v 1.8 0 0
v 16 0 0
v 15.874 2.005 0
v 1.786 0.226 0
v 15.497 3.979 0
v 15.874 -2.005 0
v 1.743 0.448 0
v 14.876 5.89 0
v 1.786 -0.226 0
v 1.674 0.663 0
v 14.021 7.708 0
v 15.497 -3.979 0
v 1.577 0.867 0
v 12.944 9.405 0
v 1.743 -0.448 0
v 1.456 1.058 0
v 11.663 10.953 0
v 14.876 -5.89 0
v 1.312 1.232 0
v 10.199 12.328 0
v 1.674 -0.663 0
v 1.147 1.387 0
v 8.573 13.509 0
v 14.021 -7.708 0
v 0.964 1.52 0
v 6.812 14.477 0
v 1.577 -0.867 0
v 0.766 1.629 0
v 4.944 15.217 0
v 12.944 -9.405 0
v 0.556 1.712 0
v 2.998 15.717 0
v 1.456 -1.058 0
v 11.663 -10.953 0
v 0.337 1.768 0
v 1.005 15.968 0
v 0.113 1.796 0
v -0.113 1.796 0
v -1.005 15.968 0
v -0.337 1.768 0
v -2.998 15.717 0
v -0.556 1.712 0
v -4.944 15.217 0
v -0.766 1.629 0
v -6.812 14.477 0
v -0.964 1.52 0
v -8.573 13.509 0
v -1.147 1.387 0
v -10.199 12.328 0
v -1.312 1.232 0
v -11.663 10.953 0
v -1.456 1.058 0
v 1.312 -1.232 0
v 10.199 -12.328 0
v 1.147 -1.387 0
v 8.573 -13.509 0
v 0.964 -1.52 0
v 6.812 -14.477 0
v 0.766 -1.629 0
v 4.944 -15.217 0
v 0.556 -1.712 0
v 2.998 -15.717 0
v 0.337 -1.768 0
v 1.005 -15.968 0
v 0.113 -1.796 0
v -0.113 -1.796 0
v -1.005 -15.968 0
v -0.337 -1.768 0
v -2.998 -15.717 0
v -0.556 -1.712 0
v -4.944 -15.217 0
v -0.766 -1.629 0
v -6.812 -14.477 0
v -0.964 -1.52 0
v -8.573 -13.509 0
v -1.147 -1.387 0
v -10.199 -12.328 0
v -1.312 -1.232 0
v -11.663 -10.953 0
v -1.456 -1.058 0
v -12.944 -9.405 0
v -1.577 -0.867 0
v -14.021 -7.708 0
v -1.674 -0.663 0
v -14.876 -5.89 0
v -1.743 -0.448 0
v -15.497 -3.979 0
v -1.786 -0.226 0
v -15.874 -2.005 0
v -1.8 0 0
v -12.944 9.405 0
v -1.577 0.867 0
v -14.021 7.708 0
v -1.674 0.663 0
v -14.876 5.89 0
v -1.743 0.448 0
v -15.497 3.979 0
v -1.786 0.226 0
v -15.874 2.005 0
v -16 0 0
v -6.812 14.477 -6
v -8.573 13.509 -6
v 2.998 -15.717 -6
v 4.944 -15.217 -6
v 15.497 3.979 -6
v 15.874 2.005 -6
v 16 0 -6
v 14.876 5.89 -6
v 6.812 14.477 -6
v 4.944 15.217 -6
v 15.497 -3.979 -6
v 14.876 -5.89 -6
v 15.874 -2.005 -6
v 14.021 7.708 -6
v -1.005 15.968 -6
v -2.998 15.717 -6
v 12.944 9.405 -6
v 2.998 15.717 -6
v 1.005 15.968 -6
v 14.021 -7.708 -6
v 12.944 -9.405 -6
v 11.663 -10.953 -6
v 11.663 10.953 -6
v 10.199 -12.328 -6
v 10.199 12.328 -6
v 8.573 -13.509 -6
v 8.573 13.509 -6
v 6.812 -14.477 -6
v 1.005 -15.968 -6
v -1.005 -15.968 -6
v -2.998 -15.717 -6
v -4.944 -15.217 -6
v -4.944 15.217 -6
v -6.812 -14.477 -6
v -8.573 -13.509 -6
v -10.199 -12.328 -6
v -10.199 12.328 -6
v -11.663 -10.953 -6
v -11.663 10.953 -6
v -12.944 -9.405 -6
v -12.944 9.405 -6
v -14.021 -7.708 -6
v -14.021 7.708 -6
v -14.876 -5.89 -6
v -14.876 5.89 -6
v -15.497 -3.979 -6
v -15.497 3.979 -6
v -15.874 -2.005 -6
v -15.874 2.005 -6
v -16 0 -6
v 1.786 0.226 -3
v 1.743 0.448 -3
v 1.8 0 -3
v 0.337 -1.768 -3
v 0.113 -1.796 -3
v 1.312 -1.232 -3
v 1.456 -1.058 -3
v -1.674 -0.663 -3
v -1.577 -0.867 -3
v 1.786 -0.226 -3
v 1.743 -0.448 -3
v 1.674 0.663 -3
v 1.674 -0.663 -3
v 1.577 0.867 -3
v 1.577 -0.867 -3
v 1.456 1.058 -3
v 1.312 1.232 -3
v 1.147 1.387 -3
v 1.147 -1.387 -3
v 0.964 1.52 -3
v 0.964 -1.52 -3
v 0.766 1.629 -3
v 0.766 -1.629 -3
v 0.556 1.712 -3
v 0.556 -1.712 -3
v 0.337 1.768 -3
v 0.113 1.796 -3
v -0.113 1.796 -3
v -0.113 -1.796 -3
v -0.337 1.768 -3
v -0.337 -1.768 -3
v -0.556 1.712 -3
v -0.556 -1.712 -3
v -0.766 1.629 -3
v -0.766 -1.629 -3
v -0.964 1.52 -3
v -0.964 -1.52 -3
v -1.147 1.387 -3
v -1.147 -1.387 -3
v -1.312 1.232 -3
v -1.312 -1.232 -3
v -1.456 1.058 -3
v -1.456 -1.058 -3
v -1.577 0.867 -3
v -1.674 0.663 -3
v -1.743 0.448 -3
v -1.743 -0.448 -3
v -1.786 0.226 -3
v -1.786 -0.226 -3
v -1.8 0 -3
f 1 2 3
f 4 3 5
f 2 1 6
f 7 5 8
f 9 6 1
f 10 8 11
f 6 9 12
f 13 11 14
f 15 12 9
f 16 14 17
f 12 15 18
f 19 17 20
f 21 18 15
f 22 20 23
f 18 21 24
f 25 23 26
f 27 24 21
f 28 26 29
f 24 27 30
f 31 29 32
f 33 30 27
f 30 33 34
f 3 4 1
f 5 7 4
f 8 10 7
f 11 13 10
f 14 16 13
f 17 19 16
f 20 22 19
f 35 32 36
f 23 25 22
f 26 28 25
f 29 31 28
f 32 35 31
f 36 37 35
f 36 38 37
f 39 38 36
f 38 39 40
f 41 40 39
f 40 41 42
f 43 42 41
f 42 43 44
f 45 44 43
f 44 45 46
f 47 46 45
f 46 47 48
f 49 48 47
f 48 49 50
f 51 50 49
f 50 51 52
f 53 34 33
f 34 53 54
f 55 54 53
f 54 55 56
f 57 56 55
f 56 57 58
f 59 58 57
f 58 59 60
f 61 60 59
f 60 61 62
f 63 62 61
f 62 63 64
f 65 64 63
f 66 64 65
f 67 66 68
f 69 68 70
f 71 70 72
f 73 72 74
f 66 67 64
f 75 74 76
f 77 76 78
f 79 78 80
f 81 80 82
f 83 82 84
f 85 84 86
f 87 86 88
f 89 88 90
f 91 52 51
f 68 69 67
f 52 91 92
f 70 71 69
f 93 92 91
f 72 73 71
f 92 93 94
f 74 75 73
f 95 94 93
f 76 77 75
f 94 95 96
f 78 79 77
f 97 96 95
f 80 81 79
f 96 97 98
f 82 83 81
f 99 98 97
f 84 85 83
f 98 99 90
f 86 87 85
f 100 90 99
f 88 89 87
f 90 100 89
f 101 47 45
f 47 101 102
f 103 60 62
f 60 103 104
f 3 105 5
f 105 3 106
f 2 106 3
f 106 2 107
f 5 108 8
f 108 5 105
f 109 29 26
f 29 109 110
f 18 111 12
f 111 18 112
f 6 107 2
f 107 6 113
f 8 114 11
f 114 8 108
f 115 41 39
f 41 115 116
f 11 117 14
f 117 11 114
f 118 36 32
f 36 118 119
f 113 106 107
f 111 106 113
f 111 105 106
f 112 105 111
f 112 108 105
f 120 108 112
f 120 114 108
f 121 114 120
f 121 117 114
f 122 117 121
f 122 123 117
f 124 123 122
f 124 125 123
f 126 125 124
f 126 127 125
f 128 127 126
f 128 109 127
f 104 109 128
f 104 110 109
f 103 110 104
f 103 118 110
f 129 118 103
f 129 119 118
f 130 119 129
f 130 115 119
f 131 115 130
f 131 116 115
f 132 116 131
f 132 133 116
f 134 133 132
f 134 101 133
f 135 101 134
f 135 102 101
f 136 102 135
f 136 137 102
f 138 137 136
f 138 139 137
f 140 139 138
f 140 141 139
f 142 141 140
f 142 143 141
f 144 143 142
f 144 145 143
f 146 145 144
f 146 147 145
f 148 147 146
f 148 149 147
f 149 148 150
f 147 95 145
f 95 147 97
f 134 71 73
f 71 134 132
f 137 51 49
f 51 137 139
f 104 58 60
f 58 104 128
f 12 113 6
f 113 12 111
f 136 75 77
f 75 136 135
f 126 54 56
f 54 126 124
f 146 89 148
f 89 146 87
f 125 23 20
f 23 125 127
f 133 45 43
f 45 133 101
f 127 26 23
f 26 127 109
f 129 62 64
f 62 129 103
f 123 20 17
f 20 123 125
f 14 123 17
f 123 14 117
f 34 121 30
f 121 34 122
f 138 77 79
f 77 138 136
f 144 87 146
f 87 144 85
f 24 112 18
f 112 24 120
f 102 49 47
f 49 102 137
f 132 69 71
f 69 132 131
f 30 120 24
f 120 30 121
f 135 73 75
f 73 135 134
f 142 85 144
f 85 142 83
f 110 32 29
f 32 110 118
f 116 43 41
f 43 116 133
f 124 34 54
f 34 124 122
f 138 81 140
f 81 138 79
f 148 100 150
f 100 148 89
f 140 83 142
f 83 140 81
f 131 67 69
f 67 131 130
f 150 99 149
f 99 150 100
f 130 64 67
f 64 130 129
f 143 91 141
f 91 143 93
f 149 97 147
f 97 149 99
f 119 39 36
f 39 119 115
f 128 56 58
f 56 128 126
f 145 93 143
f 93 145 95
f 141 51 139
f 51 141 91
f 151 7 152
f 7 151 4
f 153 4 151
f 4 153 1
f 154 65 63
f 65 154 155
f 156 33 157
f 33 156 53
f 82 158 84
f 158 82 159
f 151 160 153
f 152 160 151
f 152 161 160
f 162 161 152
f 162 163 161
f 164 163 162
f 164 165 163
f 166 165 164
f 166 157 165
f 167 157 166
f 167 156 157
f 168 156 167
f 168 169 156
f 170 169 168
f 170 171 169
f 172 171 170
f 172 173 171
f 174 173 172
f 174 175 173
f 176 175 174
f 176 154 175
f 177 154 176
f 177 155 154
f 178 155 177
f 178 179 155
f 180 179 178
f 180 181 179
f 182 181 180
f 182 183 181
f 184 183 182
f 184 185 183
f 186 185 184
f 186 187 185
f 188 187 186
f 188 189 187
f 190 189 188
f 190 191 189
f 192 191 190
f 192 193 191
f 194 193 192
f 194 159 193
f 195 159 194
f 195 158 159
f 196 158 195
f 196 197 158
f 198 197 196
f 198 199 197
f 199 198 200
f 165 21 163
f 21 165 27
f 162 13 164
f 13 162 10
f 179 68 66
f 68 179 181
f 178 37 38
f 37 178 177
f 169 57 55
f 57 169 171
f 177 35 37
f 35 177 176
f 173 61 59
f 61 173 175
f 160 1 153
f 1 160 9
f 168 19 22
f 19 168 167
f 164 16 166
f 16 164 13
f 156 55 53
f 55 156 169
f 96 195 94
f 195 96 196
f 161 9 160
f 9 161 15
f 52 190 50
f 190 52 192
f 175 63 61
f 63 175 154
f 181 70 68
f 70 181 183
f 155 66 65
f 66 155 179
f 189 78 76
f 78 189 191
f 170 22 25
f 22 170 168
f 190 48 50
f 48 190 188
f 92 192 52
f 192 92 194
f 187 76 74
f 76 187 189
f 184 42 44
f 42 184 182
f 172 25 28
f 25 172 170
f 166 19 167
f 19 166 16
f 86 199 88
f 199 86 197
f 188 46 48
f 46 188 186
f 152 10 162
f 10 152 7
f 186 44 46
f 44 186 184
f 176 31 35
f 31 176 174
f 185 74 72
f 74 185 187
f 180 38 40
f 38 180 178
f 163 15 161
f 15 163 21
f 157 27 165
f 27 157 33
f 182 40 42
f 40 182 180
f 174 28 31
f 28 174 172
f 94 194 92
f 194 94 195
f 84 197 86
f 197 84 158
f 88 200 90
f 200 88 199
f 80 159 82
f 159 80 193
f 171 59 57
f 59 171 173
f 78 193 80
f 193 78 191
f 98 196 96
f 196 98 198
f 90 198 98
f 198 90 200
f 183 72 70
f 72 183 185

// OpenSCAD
$fn = 50;


difference() {
	union() {
		translate(v = [0, 0, -3.0000000000]) {
			cylinder(h = 3, r = 7.0000000000);
		}
		translate(v = [0, 0, -6.0000000000]) {
			cylinder(h = 6, r = 16.0000000000);
		}
	}
	union() {
		#translate(v = [0, 0, -3]) {
			cylinder(h = 3, r = 1.8000000000);
		}
	}
}
